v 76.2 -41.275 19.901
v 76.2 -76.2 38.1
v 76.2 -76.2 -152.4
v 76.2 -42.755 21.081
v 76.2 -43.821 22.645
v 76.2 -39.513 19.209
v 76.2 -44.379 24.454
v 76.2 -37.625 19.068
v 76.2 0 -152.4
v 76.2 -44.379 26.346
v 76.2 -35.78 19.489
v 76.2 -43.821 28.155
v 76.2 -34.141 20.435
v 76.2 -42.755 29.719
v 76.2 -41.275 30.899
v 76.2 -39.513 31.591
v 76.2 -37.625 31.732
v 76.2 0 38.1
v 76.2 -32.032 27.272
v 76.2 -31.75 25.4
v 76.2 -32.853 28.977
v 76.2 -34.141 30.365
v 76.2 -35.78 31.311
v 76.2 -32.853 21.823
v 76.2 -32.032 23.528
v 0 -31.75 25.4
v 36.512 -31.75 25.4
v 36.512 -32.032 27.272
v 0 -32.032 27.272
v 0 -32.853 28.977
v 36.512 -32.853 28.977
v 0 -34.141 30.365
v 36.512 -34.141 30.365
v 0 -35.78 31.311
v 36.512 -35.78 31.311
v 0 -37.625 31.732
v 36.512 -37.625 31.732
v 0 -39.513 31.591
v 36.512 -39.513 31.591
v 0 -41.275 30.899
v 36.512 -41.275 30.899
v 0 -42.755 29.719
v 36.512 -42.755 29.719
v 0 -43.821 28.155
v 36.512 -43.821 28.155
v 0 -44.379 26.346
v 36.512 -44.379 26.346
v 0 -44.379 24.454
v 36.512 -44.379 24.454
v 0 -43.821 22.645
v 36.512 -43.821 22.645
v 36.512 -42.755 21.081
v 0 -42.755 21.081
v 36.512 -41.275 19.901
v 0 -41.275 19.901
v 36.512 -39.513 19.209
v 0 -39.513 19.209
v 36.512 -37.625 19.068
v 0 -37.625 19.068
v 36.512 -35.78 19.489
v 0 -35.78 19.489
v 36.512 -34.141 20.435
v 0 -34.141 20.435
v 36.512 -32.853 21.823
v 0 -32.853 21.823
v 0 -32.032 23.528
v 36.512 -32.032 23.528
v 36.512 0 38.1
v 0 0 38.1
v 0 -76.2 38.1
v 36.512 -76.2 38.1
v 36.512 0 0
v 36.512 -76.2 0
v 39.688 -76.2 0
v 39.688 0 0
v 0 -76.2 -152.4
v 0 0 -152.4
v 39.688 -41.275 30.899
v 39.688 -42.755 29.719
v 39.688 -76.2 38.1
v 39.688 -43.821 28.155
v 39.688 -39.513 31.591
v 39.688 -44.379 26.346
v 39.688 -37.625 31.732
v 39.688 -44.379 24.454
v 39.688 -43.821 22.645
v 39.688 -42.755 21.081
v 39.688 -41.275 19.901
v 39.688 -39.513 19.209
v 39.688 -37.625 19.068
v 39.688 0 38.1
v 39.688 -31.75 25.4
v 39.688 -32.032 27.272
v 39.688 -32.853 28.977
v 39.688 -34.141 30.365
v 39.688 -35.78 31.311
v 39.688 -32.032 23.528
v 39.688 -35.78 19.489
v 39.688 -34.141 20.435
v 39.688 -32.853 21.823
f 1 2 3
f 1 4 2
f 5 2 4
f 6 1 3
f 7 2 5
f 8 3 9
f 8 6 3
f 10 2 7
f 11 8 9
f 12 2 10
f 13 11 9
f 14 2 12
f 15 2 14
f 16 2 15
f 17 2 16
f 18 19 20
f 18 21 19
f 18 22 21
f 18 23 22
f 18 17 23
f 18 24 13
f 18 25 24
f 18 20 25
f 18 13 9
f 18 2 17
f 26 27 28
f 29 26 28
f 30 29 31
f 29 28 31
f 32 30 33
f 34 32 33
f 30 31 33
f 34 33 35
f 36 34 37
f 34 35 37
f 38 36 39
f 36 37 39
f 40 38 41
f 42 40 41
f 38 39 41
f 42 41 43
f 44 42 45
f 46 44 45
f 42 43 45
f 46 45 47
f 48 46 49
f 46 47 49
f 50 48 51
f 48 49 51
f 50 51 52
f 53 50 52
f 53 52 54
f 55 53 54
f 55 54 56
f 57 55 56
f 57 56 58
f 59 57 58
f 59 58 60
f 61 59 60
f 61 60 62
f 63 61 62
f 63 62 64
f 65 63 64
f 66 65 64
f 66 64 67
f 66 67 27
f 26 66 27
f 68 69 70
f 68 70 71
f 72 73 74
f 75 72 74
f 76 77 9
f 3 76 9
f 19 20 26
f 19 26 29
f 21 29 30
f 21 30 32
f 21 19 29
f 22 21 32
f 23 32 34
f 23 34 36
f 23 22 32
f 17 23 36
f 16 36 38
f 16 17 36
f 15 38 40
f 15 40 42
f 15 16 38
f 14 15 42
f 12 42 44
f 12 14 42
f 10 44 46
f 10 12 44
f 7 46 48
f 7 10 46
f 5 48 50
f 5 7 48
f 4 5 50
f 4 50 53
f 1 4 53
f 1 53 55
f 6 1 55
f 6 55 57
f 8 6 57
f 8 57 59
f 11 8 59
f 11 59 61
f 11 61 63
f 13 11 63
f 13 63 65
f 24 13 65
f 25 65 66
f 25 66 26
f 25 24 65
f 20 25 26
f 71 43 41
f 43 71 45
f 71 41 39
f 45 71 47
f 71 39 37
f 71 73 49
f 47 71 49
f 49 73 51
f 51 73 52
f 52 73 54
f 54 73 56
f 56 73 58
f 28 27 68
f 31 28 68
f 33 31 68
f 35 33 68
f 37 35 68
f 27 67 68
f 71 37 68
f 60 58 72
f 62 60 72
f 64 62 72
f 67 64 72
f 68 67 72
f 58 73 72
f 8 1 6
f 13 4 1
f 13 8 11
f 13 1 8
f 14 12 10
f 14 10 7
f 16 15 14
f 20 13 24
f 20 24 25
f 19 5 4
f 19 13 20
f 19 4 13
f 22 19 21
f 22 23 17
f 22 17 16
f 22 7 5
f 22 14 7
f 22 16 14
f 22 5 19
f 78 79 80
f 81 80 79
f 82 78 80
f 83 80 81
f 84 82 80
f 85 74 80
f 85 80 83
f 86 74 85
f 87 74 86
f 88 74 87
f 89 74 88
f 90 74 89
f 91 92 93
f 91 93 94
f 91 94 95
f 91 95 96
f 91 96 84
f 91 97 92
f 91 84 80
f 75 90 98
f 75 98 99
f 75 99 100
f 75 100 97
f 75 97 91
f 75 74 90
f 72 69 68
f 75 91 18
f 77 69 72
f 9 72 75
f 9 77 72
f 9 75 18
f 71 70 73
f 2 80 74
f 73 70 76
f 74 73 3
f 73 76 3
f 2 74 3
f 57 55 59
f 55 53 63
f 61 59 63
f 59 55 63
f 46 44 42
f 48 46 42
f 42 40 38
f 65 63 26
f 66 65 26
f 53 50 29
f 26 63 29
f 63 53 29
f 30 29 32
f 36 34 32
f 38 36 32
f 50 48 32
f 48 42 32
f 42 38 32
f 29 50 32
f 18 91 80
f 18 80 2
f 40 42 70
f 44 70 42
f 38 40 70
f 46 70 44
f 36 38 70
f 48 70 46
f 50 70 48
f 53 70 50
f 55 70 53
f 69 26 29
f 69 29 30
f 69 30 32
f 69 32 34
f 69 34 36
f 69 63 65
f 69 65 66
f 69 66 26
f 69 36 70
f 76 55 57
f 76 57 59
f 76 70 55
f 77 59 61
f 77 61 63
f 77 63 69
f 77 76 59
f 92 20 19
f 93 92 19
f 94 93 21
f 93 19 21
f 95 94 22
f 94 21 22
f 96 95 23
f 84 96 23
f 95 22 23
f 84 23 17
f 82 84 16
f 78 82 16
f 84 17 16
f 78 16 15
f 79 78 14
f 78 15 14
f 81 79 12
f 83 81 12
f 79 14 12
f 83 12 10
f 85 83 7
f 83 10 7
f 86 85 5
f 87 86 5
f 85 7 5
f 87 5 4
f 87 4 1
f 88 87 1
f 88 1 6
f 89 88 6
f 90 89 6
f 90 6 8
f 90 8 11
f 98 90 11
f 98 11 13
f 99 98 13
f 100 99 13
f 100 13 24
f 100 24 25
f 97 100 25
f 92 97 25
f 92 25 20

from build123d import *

# Parameters (mm, degrees)
F0_W     = 3.175
F0_H     = 76.2
F0_W_2   = 36.5125
F1_DEPTH = 152.4
F2_DEPTH = 38.1
F3_R     = 6.35
F4_DEPTH = 76.201
F5_R     = 6.35
F6_DEPTH = 76.2


with BuildPart() as f1:
    # F0 (on Top) → F1 (new body)
    with BuildSketch(Plane.XY):
        with Locations((38.1, -38.1)):
            Rectangle(F0_W, F0_H)
        with Locations((57.94375, -38.1)):
            Rectangle(F0_W_2, F0_H)
        with Locations((18.25625, -38.1)):
            Rectangle(F0_W_2, F0_H)
    extrude(amount=-F1_DEPTH)

    # F0 (on Top) → F2 (join)
    with BuildSketch(Plane.XY):
        with Locations((18.25625, -38.1)):
            Rectangle(F0_W_2, F0_H)
        with Locations((57.94375, -38.1)):
            Rectangle(F0_W_2, F0_H)
    extrude(amount=F2_DEPTH)

    # F3 (on face) → F4 (cut, through all)
    with BuildSketch(Plane.YZ.offset(76.2)):
        with Locations((-38.1, 25.4)):
            Circle(F3_R)
    extrude(amount=-F4_DEPTH, mode=Mode.SUBTRACT)


with BuildPart() as f6:
    # F5 (on face) → F6 (new body)
    with BuildSketch(Plane.YZ.offset(76.2)):
        with Locations((-38.1, 25.4)):
            Circle(F5_R)
    extrude(amount=-F6_DEPTH)


solid = Compound([f1.part, f6.part])
